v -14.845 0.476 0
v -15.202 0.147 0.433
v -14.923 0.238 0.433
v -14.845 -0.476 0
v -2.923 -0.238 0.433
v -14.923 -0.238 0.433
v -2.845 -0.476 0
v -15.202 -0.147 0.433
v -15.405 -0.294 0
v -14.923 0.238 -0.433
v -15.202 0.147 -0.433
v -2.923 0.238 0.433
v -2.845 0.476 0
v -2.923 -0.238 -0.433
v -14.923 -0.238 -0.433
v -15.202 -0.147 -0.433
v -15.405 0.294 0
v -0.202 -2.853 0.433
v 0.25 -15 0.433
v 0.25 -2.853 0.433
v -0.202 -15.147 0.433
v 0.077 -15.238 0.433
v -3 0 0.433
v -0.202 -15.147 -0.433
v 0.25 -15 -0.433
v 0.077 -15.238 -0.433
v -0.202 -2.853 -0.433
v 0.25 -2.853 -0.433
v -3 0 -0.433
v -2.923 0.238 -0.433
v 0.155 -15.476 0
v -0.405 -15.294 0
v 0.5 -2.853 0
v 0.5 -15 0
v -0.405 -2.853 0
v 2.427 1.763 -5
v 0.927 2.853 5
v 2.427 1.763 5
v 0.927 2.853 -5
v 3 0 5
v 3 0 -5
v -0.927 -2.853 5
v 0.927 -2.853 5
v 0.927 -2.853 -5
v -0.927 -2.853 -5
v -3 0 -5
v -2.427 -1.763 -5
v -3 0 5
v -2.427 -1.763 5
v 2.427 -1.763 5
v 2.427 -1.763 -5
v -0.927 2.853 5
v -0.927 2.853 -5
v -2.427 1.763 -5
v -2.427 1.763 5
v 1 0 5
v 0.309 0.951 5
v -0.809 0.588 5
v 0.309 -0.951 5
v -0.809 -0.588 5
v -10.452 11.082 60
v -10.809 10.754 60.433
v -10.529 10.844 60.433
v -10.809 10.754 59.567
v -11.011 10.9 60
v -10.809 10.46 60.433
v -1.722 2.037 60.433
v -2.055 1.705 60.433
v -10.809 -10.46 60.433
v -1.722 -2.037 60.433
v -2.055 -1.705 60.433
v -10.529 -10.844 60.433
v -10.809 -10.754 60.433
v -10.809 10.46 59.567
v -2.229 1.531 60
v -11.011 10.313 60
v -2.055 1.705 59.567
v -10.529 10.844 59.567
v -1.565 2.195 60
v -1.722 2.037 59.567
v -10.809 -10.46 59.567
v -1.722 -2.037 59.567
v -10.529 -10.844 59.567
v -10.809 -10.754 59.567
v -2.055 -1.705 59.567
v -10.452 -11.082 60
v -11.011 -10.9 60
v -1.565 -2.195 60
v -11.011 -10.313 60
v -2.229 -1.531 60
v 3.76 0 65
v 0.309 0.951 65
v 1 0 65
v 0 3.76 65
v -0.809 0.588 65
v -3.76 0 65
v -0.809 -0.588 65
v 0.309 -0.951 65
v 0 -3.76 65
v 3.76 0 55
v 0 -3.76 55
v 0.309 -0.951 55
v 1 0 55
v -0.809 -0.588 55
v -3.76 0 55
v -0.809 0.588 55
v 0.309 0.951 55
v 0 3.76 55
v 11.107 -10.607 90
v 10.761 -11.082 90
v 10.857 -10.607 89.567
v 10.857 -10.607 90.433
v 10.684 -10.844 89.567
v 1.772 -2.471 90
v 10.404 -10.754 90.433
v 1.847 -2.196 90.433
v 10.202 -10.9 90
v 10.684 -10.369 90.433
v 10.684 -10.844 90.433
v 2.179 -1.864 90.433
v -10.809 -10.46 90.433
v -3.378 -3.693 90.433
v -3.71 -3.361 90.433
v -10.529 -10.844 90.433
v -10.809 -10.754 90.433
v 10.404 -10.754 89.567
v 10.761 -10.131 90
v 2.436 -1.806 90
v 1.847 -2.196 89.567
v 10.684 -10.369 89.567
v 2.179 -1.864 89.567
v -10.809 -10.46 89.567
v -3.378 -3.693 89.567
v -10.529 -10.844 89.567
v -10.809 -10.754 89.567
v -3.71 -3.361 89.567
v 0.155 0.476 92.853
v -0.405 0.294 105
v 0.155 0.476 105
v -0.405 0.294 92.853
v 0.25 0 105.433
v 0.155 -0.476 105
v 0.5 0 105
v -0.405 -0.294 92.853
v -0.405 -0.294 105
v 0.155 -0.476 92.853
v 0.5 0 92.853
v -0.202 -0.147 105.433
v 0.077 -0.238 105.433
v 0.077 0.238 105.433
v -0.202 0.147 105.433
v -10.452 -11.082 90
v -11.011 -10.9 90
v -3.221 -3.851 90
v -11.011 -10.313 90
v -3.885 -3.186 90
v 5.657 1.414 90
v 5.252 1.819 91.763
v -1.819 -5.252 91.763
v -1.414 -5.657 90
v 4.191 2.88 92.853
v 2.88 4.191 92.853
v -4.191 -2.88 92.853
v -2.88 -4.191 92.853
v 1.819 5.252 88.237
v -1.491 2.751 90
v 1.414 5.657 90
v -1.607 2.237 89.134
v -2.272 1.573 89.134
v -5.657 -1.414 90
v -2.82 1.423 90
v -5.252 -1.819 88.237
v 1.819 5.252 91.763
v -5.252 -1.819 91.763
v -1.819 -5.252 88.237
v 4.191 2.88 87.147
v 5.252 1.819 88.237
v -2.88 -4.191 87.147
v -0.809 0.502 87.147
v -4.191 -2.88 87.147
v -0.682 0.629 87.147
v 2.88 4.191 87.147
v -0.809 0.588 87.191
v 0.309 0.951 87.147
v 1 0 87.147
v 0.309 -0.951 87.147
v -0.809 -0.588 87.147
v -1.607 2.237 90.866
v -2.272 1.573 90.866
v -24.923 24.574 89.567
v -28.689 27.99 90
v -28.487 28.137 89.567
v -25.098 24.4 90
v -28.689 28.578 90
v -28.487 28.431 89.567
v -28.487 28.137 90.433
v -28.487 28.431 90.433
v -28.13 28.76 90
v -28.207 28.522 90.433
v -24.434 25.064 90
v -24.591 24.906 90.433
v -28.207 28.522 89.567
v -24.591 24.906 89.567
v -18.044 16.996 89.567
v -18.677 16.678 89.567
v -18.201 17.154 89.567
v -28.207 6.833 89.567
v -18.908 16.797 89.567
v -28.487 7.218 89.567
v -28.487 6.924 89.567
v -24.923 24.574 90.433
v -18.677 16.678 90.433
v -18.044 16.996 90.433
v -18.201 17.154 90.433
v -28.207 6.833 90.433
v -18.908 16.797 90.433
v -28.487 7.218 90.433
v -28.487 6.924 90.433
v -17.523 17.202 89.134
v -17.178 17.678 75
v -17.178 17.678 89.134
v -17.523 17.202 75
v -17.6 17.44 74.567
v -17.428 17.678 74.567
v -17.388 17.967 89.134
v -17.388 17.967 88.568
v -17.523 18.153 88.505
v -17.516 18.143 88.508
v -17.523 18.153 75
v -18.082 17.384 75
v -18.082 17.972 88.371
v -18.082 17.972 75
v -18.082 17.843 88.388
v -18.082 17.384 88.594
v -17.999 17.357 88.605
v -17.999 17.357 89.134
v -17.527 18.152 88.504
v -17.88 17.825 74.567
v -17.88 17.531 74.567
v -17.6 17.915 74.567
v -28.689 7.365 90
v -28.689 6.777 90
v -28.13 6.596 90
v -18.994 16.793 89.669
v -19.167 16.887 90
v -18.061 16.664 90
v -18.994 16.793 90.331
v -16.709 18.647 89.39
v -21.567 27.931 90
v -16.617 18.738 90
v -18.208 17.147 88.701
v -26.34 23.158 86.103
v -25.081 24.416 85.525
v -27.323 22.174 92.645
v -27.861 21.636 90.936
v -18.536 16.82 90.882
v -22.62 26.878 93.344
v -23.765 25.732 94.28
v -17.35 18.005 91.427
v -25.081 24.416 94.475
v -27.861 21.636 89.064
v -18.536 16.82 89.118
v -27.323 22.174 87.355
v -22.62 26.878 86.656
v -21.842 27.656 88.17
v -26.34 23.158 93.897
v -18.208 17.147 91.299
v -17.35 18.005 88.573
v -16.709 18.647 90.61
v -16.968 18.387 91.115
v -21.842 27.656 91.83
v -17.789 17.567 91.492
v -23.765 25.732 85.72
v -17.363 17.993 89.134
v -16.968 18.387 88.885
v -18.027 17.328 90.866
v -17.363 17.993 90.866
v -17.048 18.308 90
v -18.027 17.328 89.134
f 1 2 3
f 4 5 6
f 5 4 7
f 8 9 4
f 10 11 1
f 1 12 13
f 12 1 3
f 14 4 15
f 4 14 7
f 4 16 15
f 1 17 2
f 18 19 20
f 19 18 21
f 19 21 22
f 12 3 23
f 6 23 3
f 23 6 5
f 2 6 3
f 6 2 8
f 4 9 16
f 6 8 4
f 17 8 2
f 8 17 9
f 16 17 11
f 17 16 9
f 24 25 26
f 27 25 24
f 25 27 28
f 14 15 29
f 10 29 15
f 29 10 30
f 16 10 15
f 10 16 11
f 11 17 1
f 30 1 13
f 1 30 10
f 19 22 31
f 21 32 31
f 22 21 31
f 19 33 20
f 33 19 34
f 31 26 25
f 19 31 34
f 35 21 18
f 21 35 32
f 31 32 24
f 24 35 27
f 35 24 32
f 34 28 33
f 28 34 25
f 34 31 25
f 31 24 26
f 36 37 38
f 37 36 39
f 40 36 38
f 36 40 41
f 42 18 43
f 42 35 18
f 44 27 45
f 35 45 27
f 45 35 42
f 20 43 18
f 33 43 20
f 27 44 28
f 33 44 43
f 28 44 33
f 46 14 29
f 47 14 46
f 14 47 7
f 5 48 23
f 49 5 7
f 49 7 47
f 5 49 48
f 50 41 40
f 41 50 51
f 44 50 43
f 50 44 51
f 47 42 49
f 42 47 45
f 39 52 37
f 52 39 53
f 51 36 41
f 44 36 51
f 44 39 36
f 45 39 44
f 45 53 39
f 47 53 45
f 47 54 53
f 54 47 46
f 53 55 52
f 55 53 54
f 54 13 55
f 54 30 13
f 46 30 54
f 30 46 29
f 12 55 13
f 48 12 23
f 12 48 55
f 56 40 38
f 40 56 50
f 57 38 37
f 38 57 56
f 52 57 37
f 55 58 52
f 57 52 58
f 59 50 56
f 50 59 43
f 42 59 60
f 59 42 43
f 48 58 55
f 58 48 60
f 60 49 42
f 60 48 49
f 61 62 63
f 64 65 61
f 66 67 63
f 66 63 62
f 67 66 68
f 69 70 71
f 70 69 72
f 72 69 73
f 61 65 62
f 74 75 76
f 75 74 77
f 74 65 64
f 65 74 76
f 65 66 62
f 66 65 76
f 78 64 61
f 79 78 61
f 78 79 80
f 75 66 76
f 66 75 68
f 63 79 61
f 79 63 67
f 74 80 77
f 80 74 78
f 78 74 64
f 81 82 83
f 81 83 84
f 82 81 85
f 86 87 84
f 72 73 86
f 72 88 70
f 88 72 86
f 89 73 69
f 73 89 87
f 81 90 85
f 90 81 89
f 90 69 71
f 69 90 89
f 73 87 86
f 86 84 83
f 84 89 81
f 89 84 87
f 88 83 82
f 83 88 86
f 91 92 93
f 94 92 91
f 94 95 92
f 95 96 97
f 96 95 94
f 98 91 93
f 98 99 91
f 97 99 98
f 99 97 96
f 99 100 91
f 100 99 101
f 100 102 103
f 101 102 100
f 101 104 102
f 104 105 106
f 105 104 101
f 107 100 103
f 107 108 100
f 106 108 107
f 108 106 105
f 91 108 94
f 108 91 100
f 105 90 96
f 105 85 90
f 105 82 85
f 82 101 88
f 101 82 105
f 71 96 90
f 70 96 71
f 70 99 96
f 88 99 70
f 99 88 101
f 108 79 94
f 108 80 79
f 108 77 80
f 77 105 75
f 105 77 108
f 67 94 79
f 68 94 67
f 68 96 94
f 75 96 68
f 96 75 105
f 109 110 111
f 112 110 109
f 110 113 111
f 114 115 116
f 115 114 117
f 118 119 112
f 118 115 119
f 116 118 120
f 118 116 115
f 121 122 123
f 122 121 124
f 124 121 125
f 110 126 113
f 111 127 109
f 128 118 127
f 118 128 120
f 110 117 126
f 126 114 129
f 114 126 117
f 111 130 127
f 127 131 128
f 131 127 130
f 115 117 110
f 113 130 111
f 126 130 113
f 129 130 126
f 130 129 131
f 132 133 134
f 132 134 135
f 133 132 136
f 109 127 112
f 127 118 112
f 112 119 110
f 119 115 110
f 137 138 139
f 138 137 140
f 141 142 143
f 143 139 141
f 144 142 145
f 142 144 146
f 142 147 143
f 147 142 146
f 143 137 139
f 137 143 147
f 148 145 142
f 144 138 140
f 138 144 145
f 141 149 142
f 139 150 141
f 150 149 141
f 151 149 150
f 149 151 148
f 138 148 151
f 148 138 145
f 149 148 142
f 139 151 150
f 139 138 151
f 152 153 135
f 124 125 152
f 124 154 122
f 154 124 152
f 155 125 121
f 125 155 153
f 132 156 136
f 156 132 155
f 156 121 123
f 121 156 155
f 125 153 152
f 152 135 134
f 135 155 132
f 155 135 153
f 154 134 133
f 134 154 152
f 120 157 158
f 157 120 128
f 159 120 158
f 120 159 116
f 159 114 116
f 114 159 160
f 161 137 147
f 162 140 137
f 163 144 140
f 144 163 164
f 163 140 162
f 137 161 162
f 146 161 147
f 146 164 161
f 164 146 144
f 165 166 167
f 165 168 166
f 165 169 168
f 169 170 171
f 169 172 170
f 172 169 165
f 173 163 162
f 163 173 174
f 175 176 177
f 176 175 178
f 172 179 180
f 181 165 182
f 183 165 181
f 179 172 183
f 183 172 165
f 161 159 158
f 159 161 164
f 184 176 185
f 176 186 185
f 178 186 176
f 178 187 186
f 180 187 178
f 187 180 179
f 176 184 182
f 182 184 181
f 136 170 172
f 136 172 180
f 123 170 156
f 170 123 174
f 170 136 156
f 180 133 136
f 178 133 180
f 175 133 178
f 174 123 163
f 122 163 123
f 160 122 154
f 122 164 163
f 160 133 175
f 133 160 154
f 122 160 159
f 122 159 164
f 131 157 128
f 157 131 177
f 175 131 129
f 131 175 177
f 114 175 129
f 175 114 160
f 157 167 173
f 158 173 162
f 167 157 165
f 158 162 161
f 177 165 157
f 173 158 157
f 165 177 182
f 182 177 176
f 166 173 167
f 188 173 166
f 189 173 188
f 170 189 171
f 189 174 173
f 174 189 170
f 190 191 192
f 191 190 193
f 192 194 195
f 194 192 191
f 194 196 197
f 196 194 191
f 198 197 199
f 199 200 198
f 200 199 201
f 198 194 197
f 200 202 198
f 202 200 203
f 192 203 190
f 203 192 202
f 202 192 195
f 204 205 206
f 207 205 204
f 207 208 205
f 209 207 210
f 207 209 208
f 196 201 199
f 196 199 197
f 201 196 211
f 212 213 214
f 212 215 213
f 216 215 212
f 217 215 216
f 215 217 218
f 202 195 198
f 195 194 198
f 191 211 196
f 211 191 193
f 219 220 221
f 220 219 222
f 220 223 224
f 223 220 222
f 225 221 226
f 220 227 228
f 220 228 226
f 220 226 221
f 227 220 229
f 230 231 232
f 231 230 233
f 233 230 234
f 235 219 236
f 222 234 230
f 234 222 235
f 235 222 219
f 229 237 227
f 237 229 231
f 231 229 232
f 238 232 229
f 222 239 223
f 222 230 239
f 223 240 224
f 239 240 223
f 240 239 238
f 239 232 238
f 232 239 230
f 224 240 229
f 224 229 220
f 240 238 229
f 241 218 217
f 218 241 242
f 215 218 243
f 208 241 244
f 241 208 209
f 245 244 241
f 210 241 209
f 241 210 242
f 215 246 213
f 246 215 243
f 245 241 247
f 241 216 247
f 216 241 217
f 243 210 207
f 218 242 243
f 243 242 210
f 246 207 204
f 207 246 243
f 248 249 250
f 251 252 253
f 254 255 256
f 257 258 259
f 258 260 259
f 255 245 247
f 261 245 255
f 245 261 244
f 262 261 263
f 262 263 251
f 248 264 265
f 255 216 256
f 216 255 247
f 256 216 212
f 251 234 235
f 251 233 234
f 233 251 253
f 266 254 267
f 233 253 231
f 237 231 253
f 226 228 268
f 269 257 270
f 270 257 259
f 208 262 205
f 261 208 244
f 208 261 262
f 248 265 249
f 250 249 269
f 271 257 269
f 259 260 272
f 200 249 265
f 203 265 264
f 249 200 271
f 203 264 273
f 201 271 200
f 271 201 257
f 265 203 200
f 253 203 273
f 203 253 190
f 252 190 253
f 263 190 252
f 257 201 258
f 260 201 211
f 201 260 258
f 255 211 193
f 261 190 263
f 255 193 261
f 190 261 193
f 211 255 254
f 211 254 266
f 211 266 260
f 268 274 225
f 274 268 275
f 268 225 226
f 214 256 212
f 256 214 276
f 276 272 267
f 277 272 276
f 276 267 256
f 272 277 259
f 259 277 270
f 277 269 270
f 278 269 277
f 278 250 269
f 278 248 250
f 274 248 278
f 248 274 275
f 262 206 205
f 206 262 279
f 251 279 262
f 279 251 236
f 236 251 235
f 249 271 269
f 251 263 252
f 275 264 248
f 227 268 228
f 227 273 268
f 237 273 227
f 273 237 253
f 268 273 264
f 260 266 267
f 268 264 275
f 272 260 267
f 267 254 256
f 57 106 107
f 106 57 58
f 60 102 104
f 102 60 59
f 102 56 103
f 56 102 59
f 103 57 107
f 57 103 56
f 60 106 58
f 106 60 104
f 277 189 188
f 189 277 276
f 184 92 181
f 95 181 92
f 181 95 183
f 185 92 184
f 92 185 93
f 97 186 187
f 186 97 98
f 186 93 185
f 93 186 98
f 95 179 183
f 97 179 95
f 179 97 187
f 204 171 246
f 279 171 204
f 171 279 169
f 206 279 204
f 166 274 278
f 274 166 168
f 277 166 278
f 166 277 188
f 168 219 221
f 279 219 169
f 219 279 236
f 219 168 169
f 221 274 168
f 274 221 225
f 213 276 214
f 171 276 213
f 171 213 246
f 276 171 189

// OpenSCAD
/*
Copyright (c) <2023> <Ulysses Apokin (Jelisej Apokin)>

Permission is hereby granted, free of charge, to any person obtaining
a copy of this software and associated documentation files (the
"Software"), to deal in the Software without restriction, including
without limitation the rights to use, copy, modify, merge, publish,
distribute, sublicense, and/or sell copies of the Software, and to
permit persons to whom the Software is furnished to do so, subject to
the following conditions:

The above copyright notice and this permission notice shall be
included in all copies or substantial portions of the Software.

THE SOFTWARE IS PROVIDED "AS IS", WITHOUT WARRANTY OF ANY KIND,
EXPRESS OR IMPLIED, INCLUDING BUT NOT LIMITED TO THE WARRANTIES OF
MERCHANTABILITY, FITNESS FOR A PARTICULAR PURPOSE AND
NONINFRINGEMENT. IN NO EVENT SHALL THE AUTHORS OR COPYRIGHT HOLDERS BE
LIABLE FOR ANY CLAIM, DAMAGES OR OTHER LIABILITY, WHETHER IN AN ACTION
OF CONTRACT, TORT OR OTHERWISE, ARISING FROM, OUT OF OR IN CONNECTION
WITH THE SOFTWARE OR THE USE OR OTHER DEALINGS IN THE SOFTWARE.
*/

/*###################################################################
			I M P L E M E N T A T I O N
		Don't change it unless necessary!
###################################################################*/

//Colors of rendered objects
//https://get-color.ru/pastel/
tcp_pair_color = "#E4717A";
turning_pair_color = "#FCE883";
sliding_pair_color = "#FCE883";
link_color = "#F5F5DC";
link_alpha = 0.3;
//https://get-color.ru/rich/
x_axis_color = "#FF4040";
y_axis_color = "#00A86B";
z_axis_color = "#082567";

//Dimensions of rendered objects
hpair = 10; //height of the kinematic pair
rpair = 3; //radius of the kinematic pair
wpair = sqrt(PI * rpair ^ 2); //width of the kinematic pair
rlink = 1; //radius of the link between kinematic pair
raxis = 0.5; //radius of the axes in the system of axes

/*
module pair:
--Draws a kinematic pair--
@pair_type
	= "turning" for turning kinematic pair
		of the first type or the second
	= "sliding" for the sliding kinematic pair
	= "tcp" for the tool center point (last kinematic pair"
@position = this is a 3D vector (last column
		of the homogeneous coordinate transformation matrix)
@orientation = this is the rotation matrix
		of the current link relative to the zero link.
		The zero element of the vector is M(1,1).
		The eighth element of the vector is M(3,3).
*/
module pair(
	pair_type = "turning",
	position = [0,0,0],
	orientation =
		[1,0,0,
		0,1,0,
		0,0,1]
	)
{
	module system_of_axes(pos, ort)
	{
		module axis (pos, ort, p1, p2, p3, axcol)
		{
			axis_scale = 15;
			color(axcol)
			hull() {
				//1th point
				translate(pos)
				sphere(r = raxis);
				//2nd point
				translate(pos)
				translate([
					ort[p1]*axis_scale,
					ort[p2]*axis_scale,
					ort[p3]*axis_scale
				])
				sphere(r = raxis);
			};
		};
		//X-axis
		axis(pos, ort, 0, 3, 6, x_axis_color);
		//Y-axis
		axis(pos, ort, 1, 4, 7, y_axis_color);
		//Z-axis
		axis(pos, ort, 2, 5, 8, z_axis_color);
	};
	translate(position)
	rotate([
		atan2(orientation[7], orientation[8]),
		atan2(-orientation[6], sqrt((orientation[7])^2 + (orientation[8])^2)),
		atan2(orientation[3], orientation[0])
	])
	if (pair_type == "turning") {
		color(turning_pair_color)
		cylinder(h = hpair, r = rpair, center = true);
	}
	else if (pair_type == "sliding") {
		color(sliding_pair_color)
		cube([wpair, wpair, hpair], center = true);
	}
	else if (pair_type == "tcp") {
		color(tcp_pair_color)
		rotate([0, 90, 0])
		cylinder(h = hpair, r1 = rpair/2, r2 = rpair*1.5);
	}
	else {
		assert(false, "undefined sequence");
	}
	system_of_axes(position, orientation);
};

/*
module link:
--Draws connections between kinematic pairs--
@pos1 = this is a 3D vector (last column
		of the homogeneous coordinate transformation matrix)
		of the first kinematic pair
@pos2 = this is a 3D vector (last column
		of the homogeneous coordinate transformation matrix)
		of the second kinematic pair
*/
module link(pos1 = 0, pos2 = 0) {
	color(link_color, link_alpha)
	hull() {
		translate(pos1)
		sphere(r = rlink);
		translate(pos2)
		sphere(r = rlink);
	};
};

/*
function mul_matrix:
--Multiplies two matrices--
@m1 = this is a matrix.
		The zero element of the vector is M(1,1).
		The eighth element of the vector is M(3,3).
@m2 = this is a matrix.
		The zero element of the vector is M(1,1).
		The eighth element of the vector is M(3,3).
*/
function mul_matrix(
	m1 = [1, 0, 0,
		0, 1, 0,
		0, 0, 1],
	m2 = [1, 0, 0,
		0, 1, 0,
		0, 0, 1]
) = 
[
	m1[0] * m2[0] + m1[1] * m2[3] + m1[2] * m2[6],
	m1[0] * m2[1] + m1[1] * m2[4] + m1[2] * m2[7],
	m1[0] * m2[2] + m1[1] * m2[5] + m1[2] * m2[8],
	m1[3] * m2[0] + m1[4] * m2[3] + m1[5] * m2[6],
	m1[3] * m2[1] + m1[4] * m2[4] + m1[5] * m2[7],
	m1[3] * m2[2] + m1[4] * m2[5] + m1[5] * m2[8],
	m1[6] * m2[0] + m1[7] * m2[3] + m1[8] * m2[6],
	m1[6] * m2[1] + m1[7] * m2[4] + m1[8] * m2[7],
	m1[6] * m2[2] + m1[7] * m2[5] + m1[8] * m2[8]
];

/*
function mul_vector:
--Multiply matrix by vector--
@m = this is a matrix.
		The zero element of the vector is M(1,1).
		The eighth element of the vector is M(3,3).
@v = this is a 3D vector 
*/
function mul_vector(
	m = [1, 0, 0,
		0, 1, 0,
		0, 0, 1],
	v = [0, 0, 0]
) =
[
	m[0] * v[0] + m[1] * v[1] + m[2] * v[2],
	m[3] * v[0] + m[4] * v[1] + m[5] * v[2],
	m[6] * v[0] + m[7] * v[1] + m[8] * v[2]
];

//Convert radian to degrees
function rad2deg(rad) = (rad * 180) / PI;

/*###################################################################
 E X A M P L E   O F  T H E  R O B O T  G E O M E T R I C  M O D E L
						variable part
###################################################################*/

//Robotic arm dimensions
L1 = 60; //centimeter
L2 = 50; //centimeter
L3 = 25; //centimeter
Theta1 = rad2deg(-PI/4); //radian
D2 = -20; //centimeter
Theta3 = rad2deg(PI/2); //radian

Base = [-1, 0, 0,
		0, -1, 0,
		0, 0, 1];

//Kinematic pair Turning type 2
function position_pair_0() = [
	0,
	0,
	0
];
pair("turning", mul_vector(Base, position_pair_0()), mul_matrix(Base));

//Kinematic pair Sliding
function position_pair_1() = [
	0,
	0,
	L1
];
function orientation_pair_1() = [
	cos(Theta1), //0
	-sin(Theta1), //1
	0, //2
	sin(Theta1), //3
	cos(Theta1), //4
	0, //5
	0, //6
	0, //7
	1 //8
];
pair("sliding", mul_vector(Base, position_pair_1()), mul_matrix(Base, orientation_pair_1()));

//Kinematic pair Turning type 1
function position_pair_2() = [
	0,
	0,
	D2 + L1 + L2
];
function orientation_pair_2() = [
	-cos(Theta1), //0
	0, //1
	-sin(Theta1), //2
	-sin(Theta1), //3
	0, //4
	cos(Theta1), //5
	0, //6
	1, //7
	0 //8
];
pair("turning", mul_vector(Base, position_pair_2()), mul_matrix(Base, orientation_pair_2()));

//Tool Center Point
function position_tcp() = [
	L3 * cos(Theta1) * sin(Theta3),
	L3 * sin(Theta1) * sin(Theta3),
	L3 * cos(Theta3) + D2 + L1 + L2
];
function orientation_tcp() = [
	cos(Theta1) * sin(Theta3), //0
	cos(Theta1) * cos(Theta3), //1
	-sin(Theta1), //2
	sin(Theta1) * sin(Theta3), //3
	sin(Theta1) * cos(Theta3), //4
	cos(Theta1), //5
	cos(Theta3), //6
	-sin(Theta3), //7
	0 //8
];
pair("tcp", mul_vector(Base, position_tcp()), mul_matrix(Base, orientation_tcp()));
echo(position_tcp());

link(mul_vector(Base, position_pair_0()), mul_vector(Base, position_pair_1()));
link(mul_vector(Base, position_pair_1()), mul_vector(Base, position_pair_2()));
link(mul_vector(Base, position_pair_2()), mul_vector(Base, position_tcp()));
